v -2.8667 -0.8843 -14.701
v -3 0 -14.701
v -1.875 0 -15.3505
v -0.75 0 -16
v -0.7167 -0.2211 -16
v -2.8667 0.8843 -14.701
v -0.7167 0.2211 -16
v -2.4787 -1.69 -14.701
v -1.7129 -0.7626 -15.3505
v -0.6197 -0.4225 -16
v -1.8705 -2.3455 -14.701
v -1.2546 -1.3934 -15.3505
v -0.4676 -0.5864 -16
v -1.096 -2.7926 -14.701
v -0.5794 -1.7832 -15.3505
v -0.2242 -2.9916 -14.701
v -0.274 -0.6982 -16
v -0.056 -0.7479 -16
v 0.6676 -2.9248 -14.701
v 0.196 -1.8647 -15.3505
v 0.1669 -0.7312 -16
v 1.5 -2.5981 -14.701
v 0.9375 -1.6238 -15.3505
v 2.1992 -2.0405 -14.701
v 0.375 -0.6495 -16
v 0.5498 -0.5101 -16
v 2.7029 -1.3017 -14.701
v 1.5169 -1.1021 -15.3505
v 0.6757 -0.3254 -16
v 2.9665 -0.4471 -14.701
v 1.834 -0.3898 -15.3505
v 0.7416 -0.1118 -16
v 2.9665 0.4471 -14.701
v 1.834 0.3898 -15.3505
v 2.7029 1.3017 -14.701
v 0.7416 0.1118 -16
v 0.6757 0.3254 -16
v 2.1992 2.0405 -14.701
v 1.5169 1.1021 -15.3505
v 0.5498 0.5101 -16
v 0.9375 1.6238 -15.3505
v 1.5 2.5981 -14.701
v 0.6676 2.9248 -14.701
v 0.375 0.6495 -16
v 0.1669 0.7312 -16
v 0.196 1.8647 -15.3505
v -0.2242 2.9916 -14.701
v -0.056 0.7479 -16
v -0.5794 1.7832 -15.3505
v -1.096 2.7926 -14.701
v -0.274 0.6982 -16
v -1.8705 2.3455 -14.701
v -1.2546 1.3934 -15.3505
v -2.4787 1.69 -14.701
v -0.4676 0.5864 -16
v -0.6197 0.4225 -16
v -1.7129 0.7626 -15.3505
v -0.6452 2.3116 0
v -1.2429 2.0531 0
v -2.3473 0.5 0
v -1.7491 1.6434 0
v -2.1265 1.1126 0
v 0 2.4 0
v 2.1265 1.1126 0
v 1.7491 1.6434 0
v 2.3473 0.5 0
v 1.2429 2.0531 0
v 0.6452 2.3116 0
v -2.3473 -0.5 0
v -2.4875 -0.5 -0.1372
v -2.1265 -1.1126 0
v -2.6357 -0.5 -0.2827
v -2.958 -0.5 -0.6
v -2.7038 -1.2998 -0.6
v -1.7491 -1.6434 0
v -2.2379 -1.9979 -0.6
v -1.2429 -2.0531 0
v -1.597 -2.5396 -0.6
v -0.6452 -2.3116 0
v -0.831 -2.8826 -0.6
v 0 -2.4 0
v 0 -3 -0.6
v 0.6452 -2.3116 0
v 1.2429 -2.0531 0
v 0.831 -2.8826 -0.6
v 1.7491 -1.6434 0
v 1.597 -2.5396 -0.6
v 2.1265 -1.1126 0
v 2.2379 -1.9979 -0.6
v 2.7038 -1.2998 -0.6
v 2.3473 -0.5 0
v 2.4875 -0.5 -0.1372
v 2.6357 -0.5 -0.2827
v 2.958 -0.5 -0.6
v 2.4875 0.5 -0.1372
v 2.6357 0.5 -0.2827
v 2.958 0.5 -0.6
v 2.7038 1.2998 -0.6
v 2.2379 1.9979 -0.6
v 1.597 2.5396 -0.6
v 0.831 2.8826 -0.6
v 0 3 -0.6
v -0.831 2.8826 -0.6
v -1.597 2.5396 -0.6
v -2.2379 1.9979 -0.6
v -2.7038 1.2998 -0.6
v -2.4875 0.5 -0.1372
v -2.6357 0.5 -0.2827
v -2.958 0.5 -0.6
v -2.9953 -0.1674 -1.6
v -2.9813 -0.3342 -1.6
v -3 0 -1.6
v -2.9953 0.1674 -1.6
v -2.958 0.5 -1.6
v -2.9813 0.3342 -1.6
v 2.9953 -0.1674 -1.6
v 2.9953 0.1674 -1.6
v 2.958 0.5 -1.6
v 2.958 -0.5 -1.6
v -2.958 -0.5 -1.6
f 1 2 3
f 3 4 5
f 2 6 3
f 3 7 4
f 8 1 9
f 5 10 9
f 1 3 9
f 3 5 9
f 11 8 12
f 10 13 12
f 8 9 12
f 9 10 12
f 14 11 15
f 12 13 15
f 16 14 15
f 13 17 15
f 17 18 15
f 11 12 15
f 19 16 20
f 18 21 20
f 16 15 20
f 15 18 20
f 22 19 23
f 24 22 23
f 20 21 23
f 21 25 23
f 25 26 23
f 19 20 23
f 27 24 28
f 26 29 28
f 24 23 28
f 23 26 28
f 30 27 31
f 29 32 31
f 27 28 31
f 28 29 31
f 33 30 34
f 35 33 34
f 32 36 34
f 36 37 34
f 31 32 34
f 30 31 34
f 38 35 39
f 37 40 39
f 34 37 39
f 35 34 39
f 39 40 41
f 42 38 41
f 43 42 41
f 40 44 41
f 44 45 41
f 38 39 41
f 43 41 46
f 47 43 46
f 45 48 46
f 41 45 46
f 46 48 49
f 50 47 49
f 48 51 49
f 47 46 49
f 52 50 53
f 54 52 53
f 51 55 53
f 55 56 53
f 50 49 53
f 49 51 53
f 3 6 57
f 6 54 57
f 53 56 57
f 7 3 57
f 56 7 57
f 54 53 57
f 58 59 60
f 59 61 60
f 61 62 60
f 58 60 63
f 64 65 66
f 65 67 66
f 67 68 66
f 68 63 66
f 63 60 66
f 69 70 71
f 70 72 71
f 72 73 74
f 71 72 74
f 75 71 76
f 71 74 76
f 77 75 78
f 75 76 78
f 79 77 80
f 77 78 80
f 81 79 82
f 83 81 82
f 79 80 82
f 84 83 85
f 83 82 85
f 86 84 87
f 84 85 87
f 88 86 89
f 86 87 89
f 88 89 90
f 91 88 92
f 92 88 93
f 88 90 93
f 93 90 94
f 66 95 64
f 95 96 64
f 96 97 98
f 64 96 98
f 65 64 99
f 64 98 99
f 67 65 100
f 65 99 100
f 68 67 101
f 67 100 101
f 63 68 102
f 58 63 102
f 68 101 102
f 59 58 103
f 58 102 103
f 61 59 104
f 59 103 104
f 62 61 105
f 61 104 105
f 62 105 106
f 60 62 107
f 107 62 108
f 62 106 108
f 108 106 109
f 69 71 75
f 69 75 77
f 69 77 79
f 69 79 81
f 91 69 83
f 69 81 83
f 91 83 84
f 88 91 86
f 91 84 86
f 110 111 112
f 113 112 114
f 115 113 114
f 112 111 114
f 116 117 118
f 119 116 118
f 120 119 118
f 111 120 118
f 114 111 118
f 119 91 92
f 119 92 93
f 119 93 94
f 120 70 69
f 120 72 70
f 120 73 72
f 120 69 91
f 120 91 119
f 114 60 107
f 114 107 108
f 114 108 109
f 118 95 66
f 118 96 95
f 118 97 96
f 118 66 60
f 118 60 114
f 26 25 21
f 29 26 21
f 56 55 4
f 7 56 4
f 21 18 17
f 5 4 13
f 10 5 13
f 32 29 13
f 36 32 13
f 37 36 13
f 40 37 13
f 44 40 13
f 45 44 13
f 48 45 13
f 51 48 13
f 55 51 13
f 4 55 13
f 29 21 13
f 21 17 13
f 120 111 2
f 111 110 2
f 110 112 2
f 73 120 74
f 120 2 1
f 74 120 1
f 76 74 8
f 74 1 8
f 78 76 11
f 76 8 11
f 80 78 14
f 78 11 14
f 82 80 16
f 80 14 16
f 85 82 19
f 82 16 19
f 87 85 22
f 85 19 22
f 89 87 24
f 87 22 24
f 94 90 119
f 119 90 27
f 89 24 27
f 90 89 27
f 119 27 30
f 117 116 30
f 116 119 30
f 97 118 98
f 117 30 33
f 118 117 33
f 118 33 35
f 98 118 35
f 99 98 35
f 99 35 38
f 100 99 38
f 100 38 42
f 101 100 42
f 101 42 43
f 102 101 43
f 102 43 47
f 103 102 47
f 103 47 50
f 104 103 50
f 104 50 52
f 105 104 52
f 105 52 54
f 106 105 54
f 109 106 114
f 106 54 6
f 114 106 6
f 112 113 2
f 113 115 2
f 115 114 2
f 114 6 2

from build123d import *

# Parameters (mm, degrees)
SKETCH_2_W               = 1.6
SKETCH_2_H               = 1
CUT_EXTRUDE_1_DEPTH      = 4
CUT_EXTRUDE_1_DEPTH_BACK = 4
CHAMFER_1_SIZE           = 0.6


with BuildPart() as part:
    # Эскиз1 → Повернуть1 (revolve)
    with BuildSketch(Plane(origin=(0, 0, 0), x_dir=(1, 0, 0), z_dir=(0, 1, 0))):
        Polygon((0, 0), (-3, 0), (-3, 14.700961894), (-0.75, 16), (0, 16), align=None)
    revolve(axis=Axis((0, 0, -16), (0, 0, 1)))

    # Эскиз2 → Вырез-Вытянуть1 (cut, two sides)
    with BuildSketch(Plane(origin=(0, 0, 0), x_dir=(0, 0, -1), z_dir=(1, 0, 0))) as cut_extrude_1_sk:
        with Locations((0.8, 0)):
            Rectangle(SKETCH_2_W, SKETCH_2_H)
    extrude(amount=CUT_EXTRUDE_1_DEPTH, mode=Mode.SUBTRACT)
    extrude(cut_extrude_1_sk.sketch, amount=-CUT_EXTRUDE_1_DEPTH_BACK, mode=Mode.SUBTRACT)

    # Фаска1
    chamfer_1_edges = [part.edges().sort_by_distance(p)[0] for p in [
        (0, 3, 0),
        (0, -3, 0),
    ]]
    chamfer(chamfer_1_edges, length=CHAMFER_1_SIZE)


solid = part.part
